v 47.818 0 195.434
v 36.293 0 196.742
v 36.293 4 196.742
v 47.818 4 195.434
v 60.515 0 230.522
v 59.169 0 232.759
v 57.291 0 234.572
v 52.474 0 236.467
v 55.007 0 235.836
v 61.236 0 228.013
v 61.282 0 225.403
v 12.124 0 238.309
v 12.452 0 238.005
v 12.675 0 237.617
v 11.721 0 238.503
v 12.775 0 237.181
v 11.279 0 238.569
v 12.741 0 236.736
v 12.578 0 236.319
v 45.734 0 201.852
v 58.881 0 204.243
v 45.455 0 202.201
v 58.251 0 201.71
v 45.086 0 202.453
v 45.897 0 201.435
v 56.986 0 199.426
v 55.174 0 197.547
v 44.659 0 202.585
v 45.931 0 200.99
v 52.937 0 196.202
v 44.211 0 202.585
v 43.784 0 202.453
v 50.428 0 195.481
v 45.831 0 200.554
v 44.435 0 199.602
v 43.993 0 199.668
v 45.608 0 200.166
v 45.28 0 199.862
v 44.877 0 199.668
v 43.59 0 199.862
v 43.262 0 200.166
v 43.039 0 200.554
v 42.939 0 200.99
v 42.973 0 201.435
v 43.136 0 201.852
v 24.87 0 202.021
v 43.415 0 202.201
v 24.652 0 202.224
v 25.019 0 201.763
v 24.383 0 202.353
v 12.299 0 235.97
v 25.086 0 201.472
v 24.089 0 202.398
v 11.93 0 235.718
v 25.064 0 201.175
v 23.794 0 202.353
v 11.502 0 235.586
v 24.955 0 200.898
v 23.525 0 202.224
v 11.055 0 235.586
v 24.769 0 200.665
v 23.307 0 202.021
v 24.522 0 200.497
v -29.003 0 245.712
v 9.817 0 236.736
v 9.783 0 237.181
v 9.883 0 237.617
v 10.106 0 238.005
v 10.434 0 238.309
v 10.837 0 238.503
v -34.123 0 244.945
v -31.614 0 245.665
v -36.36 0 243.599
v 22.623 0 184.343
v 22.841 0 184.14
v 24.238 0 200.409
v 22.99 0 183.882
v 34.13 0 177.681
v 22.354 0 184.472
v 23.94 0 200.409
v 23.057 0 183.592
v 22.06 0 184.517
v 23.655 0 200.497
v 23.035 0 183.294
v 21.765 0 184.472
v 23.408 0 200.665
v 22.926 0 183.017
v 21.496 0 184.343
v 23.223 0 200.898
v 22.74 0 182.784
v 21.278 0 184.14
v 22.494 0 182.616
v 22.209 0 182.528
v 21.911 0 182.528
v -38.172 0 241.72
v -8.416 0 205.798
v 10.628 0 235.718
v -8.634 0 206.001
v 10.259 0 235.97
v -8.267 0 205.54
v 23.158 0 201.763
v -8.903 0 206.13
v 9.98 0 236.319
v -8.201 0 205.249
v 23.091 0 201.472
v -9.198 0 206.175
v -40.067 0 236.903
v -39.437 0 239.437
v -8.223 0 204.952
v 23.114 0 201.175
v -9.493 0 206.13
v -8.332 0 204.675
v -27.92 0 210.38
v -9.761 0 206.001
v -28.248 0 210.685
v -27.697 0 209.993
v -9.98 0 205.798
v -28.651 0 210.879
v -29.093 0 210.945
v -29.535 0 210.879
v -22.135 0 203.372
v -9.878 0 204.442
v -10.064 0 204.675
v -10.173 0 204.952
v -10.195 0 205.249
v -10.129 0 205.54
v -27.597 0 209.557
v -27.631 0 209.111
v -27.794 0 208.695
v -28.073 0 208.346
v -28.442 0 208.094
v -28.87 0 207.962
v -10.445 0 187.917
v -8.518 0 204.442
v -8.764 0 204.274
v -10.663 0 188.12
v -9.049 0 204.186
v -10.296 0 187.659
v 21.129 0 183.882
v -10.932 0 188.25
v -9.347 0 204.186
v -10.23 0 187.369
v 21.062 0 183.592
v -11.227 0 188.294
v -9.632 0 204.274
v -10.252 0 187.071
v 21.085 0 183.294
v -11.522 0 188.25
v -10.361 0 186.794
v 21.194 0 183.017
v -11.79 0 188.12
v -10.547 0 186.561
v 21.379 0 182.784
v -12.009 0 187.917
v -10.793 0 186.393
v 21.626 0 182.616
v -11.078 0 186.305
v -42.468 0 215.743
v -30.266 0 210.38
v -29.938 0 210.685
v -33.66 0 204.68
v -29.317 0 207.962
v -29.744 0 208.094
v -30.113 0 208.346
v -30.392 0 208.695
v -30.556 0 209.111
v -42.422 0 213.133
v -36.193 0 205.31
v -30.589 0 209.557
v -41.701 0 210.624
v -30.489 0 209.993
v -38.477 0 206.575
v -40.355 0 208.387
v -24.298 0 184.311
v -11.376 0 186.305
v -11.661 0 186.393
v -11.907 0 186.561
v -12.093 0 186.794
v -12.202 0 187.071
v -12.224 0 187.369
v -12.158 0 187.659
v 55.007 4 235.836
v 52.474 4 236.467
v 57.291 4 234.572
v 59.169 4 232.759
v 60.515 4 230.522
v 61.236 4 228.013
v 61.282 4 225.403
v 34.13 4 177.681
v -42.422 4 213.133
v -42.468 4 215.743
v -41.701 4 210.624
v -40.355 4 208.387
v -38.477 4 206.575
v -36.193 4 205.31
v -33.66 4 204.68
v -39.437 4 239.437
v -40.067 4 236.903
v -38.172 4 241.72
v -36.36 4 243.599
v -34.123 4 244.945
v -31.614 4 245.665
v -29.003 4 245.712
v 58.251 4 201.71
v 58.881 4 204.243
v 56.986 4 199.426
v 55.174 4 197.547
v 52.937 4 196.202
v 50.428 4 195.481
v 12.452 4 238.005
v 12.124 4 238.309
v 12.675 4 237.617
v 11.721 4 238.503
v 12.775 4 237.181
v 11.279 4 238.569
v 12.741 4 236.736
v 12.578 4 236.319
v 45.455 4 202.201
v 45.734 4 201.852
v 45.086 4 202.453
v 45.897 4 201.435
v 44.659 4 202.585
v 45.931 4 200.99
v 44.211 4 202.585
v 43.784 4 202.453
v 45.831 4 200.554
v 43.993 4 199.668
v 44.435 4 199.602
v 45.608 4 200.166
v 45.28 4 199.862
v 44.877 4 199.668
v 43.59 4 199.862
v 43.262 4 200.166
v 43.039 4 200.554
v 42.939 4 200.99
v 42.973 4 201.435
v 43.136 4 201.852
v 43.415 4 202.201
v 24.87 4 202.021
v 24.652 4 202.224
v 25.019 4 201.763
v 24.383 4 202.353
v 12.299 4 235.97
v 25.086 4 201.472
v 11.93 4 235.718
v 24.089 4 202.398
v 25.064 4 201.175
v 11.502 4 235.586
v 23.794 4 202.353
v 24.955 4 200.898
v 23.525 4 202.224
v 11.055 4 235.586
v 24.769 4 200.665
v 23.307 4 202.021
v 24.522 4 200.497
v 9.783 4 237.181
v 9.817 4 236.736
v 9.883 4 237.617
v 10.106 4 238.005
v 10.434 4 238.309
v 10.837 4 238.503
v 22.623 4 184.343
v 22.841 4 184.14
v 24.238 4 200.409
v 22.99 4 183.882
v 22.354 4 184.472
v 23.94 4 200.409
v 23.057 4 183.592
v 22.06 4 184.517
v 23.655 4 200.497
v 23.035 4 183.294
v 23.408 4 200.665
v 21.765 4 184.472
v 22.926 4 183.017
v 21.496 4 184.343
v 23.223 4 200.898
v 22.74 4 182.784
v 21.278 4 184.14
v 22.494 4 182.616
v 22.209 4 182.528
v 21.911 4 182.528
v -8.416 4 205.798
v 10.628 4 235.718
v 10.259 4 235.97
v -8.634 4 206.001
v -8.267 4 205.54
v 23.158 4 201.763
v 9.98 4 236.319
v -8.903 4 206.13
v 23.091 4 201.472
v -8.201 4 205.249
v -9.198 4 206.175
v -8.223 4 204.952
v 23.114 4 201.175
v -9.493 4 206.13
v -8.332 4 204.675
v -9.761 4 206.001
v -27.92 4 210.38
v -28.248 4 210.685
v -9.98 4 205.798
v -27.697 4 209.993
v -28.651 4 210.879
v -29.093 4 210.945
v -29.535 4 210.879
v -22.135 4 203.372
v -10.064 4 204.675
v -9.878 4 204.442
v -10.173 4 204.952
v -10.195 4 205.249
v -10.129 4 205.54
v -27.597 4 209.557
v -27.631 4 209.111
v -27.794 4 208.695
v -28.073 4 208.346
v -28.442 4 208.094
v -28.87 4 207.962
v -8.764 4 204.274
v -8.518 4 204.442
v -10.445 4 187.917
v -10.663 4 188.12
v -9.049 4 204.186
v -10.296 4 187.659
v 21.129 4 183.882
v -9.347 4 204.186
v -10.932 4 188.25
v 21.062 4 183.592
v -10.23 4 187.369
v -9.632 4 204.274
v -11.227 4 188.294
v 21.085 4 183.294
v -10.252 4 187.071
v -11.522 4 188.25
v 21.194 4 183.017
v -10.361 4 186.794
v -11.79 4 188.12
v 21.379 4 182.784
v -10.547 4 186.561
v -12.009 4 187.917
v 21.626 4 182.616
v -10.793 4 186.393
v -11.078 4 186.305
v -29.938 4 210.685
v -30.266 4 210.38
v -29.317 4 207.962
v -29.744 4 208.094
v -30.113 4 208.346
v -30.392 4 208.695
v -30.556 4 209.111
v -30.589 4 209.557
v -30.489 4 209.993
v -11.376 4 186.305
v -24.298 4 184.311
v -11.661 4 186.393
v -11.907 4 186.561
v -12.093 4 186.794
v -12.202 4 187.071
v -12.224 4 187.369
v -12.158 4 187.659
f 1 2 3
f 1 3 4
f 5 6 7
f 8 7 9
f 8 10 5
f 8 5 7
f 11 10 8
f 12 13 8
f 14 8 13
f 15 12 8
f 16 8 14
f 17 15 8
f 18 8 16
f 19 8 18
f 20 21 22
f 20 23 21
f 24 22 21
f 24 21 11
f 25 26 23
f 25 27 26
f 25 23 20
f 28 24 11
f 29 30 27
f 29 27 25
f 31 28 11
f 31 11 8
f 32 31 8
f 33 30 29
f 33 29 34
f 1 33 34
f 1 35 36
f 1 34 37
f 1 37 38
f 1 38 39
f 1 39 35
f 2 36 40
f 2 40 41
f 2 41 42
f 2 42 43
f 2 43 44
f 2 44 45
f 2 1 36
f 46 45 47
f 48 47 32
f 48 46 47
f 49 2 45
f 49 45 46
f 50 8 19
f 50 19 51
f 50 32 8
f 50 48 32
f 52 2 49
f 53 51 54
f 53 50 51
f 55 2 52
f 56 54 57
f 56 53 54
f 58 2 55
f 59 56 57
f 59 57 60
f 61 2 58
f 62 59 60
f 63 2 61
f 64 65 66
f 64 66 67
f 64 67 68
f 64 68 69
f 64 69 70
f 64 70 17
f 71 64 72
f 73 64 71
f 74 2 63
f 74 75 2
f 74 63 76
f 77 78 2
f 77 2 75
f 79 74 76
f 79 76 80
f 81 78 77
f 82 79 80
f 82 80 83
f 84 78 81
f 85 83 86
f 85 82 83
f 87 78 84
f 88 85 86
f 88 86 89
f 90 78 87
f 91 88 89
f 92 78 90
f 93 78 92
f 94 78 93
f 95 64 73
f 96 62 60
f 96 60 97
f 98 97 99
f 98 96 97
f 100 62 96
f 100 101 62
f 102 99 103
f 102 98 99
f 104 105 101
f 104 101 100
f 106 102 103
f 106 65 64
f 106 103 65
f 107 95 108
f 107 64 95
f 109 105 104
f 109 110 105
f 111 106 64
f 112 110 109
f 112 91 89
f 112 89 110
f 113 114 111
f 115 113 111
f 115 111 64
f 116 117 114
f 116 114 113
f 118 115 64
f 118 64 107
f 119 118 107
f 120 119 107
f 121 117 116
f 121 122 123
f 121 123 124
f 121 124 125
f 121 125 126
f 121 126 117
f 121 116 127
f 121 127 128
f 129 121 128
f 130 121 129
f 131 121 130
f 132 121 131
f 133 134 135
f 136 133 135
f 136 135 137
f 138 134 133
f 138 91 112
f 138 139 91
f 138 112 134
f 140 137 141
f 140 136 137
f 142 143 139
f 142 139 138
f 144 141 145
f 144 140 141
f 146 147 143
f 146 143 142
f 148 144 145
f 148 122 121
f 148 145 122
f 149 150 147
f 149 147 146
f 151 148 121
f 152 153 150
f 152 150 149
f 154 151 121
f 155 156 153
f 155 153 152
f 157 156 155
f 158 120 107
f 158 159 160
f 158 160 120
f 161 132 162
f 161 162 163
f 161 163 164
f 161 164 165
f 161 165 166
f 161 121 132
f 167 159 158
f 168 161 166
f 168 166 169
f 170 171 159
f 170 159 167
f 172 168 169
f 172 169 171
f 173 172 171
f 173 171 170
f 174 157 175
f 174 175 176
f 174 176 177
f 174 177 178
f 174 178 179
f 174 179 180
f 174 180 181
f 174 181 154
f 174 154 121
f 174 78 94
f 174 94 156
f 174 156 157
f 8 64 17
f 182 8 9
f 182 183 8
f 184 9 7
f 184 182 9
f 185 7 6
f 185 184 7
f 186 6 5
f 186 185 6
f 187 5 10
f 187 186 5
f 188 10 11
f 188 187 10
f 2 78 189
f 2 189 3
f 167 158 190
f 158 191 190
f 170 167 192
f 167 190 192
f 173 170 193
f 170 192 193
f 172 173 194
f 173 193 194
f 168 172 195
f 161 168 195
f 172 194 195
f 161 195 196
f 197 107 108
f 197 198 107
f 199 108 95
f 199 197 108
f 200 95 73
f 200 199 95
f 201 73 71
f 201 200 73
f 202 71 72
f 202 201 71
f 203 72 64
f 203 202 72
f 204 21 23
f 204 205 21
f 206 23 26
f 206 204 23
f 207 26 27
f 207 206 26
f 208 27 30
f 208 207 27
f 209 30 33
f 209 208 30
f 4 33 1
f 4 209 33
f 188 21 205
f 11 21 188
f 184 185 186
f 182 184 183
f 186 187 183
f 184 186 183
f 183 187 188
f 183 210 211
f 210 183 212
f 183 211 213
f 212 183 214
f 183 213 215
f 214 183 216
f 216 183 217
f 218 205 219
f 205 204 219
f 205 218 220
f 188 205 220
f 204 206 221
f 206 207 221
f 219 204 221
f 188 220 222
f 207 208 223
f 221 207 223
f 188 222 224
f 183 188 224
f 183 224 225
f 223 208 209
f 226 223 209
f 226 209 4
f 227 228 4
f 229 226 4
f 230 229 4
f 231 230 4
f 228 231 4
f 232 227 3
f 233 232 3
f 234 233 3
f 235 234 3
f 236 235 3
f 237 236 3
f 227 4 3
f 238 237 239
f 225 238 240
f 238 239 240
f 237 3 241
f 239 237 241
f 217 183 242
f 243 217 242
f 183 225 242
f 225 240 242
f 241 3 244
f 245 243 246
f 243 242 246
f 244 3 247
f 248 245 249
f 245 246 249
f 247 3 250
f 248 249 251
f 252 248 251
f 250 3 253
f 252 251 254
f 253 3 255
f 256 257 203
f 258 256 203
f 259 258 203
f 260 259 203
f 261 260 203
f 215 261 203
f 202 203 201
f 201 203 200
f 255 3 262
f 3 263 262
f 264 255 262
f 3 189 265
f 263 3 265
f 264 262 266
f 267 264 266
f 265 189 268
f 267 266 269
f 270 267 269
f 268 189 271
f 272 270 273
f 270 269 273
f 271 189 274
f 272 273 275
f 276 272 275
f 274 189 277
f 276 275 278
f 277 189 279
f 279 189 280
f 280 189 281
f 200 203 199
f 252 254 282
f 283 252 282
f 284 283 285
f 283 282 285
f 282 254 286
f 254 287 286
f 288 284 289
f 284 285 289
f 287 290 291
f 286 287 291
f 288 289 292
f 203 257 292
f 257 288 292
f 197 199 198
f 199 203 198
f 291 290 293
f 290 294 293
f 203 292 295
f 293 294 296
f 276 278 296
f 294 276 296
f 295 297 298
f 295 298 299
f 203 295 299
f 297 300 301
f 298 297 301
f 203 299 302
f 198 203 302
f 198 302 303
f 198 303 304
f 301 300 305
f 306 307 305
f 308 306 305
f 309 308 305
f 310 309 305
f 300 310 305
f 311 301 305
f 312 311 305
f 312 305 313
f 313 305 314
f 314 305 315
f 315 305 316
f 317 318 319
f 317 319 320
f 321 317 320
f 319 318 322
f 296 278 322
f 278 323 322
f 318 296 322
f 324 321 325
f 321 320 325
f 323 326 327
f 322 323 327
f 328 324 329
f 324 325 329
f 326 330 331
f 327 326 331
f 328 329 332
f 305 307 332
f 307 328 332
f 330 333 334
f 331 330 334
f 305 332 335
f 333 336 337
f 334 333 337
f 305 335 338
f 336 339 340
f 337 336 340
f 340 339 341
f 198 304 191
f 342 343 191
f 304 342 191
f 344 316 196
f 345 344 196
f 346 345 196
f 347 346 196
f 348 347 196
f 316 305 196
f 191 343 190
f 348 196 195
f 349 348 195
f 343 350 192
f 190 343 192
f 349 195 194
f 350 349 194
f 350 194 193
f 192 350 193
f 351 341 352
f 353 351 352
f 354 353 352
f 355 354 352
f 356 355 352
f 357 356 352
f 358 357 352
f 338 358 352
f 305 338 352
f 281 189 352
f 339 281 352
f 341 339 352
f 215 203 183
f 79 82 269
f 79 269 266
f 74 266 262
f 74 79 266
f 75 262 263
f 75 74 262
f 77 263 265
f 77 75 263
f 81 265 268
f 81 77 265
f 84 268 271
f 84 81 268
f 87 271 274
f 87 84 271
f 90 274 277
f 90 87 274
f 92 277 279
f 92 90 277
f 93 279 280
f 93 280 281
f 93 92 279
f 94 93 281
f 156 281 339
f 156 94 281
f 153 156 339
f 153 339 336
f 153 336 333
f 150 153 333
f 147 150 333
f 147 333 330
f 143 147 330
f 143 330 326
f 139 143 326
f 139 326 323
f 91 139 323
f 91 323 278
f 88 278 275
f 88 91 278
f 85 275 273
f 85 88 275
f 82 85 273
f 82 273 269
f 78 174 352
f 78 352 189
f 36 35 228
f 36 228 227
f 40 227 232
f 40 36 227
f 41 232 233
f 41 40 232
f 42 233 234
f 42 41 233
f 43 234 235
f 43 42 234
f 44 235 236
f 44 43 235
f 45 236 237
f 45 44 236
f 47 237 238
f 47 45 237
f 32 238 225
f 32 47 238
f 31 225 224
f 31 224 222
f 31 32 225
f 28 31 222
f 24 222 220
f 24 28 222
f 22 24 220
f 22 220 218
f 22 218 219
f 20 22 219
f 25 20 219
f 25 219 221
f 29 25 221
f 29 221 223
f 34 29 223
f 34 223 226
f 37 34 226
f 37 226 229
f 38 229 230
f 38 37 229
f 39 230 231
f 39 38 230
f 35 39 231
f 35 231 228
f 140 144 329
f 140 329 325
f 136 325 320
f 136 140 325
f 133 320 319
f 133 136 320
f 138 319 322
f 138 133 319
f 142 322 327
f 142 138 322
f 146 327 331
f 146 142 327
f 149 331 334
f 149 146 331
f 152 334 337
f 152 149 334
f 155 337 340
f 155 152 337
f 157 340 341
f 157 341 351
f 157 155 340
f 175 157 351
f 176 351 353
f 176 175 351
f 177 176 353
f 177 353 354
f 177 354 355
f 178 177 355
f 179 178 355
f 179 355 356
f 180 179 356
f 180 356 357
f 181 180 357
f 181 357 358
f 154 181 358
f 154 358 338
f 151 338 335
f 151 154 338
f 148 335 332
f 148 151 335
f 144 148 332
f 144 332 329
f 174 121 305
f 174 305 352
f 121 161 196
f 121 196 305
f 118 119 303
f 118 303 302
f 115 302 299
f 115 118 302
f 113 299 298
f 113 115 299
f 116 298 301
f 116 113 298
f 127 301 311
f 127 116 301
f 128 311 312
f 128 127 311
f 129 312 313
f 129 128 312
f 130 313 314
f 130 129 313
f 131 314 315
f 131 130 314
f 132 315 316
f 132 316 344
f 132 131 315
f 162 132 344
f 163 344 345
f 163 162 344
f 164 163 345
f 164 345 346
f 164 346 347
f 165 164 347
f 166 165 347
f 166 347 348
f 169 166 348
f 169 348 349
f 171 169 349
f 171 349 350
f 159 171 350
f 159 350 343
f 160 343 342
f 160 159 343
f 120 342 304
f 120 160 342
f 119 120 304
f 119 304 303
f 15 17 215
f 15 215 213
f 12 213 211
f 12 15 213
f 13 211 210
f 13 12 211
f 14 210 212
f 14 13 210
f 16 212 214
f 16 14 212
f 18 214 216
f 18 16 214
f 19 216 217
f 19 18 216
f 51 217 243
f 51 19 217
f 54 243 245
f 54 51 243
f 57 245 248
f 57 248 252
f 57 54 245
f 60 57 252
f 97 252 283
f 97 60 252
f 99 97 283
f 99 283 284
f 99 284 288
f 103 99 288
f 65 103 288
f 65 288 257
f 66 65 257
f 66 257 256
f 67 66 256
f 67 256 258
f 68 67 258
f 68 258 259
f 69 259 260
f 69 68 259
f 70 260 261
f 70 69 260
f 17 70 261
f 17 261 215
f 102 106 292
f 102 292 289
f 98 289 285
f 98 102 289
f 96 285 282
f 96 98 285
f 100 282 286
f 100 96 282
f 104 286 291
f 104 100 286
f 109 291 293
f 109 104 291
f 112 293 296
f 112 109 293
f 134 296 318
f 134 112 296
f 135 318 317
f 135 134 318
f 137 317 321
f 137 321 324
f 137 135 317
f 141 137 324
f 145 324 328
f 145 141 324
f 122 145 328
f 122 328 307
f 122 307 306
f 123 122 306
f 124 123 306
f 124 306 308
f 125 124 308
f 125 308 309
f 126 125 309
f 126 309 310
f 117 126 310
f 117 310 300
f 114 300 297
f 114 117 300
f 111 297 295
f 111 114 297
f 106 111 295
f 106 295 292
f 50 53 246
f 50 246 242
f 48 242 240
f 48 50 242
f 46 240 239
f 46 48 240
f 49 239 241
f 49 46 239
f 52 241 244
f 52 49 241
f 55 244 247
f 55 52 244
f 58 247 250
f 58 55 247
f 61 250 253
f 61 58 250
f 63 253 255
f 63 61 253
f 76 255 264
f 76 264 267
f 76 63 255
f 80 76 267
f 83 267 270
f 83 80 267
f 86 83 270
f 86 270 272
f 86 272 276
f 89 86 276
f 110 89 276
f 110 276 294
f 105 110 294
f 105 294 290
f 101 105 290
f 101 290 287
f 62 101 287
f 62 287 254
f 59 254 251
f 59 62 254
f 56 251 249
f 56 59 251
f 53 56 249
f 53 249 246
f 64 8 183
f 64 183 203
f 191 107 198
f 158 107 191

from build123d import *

# Parameters (mm, degrees)
SKETCH1_R           = 1.5
SKETCH1_R_2         = 1
BOSS_EXTRUDE1_DEPTH = 4
FILLET1_R           = 10
FILLET2_R           = 10
FILLET3_R           = 10
FILLET4_R           = 10


with BuildPart() as part:
    # Sketch1 → Boss-Extrude1 (new body)
    with BuildSketch(Plane(origin=(0, 0, 0), x_dir=(1, 0, 0), z_dir=(0, 1, 0))):
        Polygon((-43.595803766, -205.807188304), (-22.135109681, -203.371959758), (-24.298008335, -184.311199966), (34.130185477, -177.681125241), (36.293084131, -196.741885032), (57.753778216, -194.306656487), (62.409879754, -235.339014996), (-38.939702228, -246.839546813), align=None)
        with Locations(Location((-29.093140713, -209.445179895, 0), (0, 0, 270))):
            Circle(SKETCH1_R, mode=Mode.SUBTRACT)
        with Locations(Location((44.434987391, -201.101656812, 0), (0, 0, 90))):
            Circle(SKETCH1_R, mode=Mode.SUBTRACT)
        with Locations(Location((11.278933321, -237.069365642, 0), (0, 0, 270))):
            Circle(SKETCH1_R, mode=Mode.SUBTRACT)
        with Locations(Location((-9.197768444, -205.174739373, 0), (0, 0, 270))):
            Circle(SKETCH1_R_2, mode=Mode.SUBTRACT)
        with Locations(Location((-11.22676603, -187.293996073, 0), (0, 0, 270))):
            Circle(SKETCH1_R_2, mode=Mode.SUBTRACT)
        with Locations(Location((22.059616288, -183.516860623, 0), (0, 0, 270))):
            Circle(SKETCH1_R_2, mode=Mode.SUBTRACT)
        with Locations(Location((24.088613874, -201.397603923, 0), (0, 0, 270))):
            Circle(SKETCH1_R_2, mode=Mode.SUBTRACT)
    extrude(amount=BOSS_EXTRUDE1_DEPTH)

    # Fillet1
    fillet1_edges = [part.edges().sort_by_distance(p)[0] for p in [
        (-38.939702228, 2, 246.839546813),
    ]]
    fillet(fillet1_edges, radius=FILLET1_R)

    # Fillet2
    fillet2_edges = [part.edges().sort_by_distance(p)[0] for p in [
        (62.409879754, 2, 235.339014996),
    ]]
    fillet(fillet2_edges, radius=FILLET2_R)

    # Fillet3
    fillet3_edges = [part.edges().sort_by_distance(p)[0] for p in [
        (57.753778216, 2, 194.306656487),
    ]]
    fillet(fillet3_edges, radius=FILLET3_R)

    # Fillet4
    fillet4_edges = [part.edges().sort_by_distance(p)[0] for p in [
        (-43.595803766, 2, 205.807188304),
    ]]
    fillet(fillet4_edges, radius=FILLET4_R)


solid = part.part
